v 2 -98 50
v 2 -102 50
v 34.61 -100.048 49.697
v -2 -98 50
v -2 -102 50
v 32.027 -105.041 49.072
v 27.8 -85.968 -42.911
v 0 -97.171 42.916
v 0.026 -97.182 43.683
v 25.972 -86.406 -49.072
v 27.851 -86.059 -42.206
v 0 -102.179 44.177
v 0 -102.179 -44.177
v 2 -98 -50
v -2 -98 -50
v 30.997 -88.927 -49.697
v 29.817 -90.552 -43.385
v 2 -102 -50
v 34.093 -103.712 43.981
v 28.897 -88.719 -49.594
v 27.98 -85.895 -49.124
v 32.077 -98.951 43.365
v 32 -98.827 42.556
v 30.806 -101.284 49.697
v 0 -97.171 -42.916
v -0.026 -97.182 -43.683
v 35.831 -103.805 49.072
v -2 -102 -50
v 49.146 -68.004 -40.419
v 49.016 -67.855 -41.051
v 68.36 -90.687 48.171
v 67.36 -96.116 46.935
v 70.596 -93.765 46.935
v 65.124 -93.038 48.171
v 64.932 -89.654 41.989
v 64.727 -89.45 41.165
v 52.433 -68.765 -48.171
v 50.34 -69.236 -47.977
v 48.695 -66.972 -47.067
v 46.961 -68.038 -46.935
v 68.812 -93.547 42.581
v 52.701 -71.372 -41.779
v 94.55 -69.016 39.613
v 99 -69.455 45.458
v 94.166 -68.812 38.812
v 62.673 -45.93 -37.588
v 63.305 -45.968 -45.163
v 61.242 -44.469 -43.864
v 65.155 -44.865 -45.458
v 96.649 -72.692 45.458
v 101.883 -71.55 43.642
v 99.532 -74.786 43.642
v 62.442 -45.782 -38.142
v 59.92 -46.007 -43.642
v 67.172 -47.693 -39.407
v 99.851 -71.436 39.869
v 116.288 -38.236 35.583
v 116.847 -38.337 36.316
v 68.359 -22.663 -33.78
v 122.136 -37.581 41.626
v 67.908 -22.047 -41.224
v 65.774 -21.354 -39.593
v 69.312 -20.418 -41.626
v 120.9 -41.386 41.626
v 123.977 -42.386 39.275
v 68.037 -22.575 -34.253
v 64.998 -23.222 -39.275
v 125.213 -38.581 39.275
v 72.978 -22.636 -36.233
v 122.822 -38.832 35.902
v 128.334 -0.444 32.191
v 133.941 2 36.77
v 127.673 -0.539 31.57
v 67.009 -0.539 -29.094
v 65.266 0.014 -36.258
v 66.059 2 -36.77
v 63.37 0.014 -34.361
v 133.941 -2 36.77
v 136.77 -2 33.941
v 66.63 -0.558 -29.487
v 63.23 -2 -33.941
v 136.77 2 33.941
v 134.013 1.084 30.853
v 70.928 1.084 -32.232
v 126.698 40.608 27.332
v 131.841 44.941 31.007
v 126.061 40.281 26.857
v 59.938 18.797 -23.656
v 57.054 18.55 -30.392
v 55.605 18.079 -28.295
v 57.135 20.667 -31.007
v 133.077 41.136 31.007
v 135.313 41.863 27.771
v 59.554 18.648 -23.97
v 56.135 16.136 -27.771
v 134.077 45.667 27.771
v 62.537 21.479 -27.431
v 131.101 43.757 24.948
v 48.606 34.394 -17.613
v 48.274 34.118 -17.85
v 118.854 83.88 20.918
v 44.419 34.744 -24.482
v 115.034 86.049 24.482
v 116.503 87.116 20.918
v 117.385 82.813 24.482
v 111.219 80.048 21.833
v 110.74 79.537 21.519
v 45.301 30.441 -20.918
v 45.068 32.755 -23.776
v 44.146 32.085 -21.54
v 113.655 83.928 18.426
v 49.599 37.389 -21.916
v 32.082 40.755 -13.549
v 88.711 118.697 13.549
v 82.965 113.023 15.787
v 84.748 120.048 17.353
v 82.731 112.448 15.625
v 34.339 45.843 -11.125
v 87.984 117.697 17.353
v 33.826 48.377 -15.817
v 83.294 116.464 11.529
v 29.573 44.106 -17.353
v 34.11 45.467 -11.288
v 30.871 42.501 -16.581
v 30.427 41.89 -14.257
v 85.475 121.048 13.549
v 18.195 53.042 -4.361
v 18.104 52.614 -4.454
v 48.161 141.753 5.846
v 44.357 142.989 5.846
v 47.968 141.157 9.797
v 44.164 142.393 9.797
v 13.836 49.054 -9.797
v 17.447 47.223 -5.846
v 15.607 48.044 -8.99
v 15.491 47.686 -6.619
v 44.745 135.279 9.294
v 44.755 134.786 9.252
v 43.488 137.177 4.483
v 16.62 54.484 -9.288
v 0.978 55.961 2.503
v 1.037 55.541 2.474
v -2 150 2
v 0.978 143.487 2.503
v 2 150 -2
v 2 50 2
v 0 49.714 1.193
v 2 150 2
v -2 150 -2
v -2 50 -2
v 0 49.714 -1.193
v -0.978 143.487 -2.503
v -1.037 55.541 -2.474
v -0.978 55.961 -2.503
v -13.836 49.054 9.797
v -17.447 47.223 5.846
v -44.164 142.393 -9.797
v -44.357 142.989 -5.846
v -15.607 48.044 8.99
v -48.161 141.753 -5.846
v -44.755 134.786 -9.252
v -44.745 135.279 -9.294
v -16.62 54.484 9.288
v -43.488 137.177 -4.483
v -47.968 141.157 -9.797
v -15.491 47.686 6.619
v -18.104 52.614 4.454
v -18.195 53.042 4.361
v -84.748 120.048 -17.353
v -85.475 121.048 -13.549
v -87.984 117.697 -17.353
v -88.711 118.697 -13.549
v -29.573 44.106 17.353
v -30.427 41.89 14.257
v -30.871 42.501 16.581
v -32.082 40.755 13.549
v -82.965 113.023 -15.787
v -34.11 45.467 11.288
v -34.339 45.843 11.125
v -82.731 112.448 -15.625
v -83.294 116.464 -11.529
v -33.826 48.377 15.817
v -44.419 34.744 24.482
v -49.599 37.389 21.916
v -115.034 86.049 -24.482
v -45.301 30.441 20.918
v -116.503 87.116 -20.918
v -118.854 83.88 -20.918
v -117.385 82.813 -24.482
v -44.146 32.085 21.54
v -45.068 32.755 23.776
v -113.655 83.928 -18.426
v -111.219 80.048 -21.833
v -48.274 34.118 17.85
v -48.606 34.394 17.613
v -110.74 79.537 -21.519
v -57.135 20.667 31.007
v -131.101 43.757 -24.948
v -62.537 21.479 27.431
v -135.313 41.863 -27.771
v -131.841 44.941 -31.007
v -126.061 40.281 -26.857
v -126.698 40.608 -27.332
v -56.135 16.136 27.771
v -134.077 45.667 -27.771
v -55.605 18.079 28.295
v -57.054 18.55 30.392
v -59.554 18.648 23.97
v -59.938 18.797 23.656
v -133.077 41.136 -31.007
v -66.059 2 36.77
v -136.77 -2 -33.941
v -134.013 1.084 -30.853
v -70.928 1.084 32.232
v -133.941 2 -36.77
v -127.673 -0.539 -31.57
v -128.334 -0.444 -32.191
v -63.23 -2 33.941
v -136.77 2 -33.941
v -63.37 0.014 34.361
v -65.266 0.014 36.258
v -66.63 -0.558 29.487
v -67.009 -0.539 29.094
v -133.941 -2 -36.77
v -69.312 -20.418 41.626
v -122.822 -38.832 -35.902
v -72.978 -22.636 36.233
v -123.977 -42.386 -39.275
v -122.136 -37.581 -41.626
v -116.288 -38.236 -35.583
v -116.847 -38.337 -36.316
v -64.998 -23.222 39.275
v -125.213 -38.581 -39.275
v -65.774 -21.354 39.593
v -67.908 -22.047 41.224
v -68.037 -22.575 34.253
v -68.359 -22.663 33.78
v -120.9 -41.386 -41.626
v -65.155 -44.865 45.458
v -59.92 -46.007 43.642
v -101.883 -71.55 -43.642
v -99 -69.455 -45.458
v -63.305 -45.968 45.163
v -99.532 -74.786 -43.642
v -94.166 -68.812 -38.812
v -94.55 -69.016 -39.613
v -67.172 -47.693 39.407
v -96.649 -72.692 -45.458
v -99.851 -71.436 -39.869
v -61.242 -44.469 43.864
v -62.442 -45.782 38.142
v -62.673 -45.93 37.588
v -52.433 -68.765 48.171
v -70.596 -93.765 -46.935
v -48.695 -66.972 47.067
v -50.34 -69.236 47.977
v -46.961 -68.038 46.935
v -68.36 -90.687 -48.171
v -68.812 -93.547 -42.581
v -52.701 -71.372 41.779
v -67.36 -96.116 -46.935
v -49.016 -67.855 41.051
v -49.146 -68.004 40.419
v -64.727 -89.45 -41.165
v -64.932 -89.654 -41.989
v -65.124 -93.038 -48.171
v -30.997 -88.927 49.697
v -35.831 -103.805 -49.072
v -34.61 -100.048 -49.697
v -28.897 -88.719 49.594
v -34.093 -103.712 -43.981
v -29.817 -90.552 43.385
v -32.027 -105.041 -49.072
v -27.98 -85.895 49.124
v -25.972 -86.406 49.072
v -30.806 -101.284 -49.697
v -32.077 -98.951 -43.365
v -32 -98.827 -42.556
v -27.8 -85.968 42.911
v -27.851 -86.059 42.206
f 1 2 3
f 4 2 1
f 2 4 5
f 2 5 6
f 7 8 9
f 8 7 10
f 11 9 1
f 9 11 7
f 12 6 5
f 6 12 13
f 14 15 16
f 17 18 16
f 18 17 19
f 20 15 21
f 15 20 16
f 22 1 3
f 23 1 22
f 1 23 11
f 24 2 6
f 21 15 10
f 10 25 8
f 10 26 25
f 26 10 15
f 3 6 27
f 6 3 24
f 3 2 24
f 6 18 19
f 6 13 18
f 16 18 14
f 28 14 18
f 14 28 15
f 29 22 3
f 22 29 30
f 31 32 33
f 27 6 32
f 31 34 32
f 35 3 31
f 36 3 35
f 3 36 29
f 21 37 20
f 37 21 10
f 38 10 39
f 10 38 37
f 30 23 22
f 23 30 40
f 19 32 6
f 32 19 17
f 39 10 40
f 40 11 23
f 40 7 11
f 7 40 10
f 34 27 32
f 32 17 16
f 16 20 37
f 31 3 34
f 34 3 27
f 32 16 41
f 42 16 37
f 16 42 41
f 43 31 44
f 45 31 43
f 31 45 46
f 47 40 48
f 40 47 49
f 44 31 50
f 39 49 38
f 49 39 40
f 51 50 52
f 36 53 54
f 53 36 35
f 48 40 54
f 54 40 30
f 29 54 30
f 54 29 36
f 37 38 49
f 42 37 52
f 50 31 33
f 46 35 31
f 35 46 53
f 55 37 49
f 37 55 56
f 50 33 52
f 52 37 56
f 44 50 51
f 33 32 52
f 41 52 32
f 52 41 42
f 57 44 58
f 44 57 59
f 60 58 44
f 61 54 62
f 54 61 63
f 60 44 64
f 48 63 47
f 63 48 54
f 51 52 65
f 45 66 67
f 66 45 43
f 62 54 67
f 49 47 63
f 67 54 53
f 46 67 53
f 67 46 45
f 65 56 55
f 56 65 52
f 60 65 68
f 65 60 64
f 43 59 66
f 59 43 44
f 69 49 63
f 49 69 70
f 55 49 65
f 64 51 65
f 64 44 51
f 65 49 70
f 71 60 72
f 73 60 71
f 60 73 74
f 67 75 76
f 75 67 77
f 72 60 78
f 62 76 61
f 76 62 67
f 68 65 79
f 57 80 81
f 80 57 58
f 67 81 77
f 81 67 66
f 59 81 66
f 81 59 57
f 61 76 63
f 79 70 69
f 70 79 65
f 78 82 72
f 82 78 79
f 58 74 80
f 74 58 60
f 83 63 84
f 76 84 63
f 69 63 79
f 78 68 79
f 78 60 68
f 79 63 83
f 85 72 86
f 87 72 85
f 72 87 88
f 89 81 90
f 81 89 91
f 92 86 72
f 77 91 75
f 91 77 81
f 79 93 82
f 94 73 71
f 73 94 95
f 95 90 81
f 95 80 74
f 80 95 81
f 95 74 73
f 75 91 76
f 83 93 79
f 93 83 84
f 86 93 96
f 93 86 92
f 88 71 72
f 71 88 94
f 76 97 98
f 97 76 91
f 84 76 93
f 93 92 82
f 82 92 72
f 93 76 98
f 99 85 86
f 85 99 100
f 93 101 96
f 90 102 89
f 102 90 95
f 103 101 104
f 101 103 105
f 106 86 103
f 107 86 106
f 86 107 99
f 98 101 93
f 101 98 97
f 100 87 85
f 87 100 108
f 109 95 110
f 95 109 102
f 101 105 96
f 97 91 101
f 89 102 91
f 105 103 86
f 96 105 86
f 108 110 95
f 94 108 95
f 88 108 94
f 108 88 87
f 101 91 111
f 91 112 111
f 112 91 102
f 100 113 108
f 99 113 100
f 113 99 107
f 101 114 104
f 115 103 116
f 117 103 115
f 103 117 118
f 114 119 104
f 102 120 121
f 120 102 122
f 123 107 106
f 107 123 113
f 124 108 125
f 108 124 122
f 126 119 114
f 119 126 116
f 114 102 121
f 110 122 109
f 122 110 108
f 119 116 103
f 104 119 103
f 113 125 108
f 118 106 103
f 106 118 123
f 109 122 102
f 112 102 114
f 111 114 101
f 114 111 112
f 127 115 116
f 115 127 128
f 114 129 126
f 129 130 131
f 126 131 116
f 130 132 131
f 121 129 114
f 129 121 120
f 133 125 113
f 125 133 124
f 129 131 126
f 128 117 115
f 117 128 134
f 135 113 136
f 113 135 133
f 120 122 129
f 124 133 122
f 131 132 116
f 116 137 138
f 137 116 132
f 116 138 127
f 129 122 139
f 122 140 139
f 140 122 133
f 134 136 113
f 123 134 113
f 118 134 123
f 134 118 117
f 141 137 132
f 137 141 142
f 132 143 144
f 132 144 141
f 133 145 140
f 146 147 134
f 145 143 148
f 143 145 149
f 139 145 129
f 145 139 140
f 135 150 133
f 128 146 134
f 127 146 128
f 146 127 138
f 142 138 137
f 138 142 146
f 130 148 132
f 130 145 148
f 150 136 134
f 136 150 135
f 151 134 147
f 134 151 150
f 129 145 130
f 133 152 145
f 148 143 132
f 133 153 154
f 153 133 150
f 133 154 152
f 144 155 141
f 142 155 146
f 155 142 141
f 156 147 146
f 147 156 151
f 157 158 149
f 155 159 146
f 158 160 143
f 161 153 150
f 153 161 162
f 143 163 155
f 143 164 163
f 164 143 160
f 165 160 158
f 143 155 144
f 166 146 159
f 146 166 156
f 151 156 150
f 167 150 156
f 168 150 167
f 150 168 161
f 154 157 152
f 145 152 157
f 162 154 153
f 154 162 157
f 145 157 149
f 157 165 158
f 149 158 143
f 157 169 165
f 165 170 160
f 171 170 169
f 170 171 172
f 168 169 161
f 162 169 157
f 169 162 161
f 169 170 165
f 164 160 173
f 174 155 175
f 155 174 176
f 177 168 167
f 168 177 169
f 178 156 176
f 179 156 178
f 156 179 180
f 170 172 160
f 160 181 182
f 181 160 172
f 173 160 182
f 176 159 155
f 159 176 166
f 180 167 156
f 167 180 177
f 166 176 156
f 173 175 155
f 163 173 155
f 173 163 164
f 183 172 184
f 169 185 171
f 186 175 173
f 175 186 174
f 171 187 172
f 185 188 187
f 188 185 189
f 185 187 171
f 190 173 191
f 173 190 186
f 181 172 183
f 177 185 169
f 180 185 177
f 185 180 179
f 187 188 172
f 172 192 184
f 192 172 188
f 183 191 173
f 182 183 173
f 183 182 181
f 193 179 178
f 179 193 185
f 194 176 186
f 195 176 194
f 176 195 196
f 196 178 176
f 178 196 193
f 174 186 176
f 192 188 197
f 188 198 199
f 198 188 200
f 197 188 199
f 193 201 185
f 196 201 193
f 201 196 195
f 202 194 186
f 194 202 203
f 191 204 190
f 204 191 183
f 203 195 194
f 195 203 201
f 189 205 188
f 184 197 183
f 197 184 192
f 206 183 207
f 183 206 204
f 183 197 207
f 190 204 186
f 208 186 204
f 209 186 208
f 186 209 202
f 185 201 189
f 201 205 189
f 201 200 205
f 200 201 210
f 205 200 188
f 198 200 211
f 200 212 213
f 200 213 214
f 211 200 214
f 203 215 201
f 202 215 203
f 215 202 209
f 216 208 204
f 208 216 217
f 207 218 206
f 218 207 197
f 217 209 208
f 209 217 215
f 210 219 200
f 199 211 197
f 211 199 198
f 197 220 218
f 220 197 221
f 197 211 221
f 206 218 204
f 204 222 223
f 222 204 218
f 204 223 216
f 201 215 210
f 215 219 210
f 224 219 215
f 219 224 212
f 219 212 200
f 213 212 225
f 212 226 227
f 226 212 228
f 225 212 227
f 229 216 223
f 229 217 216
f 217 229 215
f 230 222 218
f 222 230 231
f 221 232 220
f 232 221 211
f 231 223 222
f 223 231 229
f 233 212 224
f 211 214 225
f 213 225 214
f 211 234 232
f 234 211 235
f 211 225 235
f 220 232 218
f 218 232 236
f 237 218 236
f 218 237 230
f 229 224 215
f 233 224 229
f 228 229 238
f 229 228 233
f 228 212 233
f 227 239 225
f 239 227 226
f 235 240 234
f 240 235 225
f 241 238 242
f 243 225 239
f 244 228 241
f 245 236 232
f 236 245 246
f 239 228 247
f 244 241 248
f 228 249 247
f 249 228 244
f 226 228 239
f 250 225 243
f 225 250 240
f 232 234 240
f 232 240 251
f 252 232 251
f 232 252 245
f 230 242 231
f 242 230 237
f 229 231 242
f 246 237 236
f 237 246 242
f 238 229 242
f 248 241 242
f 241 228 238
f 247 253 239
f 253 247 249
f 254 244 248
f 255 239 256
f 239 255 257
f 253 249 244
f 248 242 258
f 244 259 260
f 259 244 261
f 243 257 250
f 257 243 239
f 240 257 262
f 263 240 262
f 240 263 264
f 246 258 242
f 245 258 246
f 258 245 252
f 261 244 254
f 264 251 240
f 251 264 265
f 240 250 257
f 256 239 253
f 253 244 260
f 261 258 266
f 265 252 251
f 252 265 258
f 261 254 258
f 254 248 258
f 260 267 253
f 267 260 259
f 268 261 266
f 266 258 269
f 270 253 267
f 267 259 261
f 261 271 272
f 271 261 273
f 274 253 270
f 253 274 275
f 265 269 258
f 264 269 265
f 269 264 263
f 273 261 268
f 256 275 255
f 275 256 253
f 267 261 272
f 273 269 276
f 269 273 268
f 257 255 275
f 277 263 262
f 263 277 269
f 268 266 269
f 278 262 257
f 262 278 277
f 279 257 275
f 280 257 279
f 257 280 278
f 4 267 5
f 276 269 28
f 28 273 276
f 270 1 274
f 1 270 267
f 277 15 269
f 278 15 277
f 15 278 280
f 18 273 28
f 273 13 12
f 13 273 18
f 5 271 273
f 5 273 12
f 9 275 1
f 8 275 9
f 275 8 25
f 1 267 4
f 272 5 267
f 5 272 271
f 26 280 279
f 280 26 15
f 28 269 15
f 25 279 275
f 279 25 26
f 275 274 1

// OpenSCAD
//This generates a bunch of rods that make a twisted strip

//Resolution of Strip.
number_of_rods = 20;//[20:500]

//Thickness of the wall.
thickness = 4;//[2:0.2:10]

//Height of wall.
length = 100;//[20:200]

//Inner Radius of the strip.
radius = 100;//[20:200]

//Number of twists.
twists = 1;//[0:10]

/* [Hidden] */


for(i=[0:number_of_rods]) {
	value = i/number_of_rods;
	value_1 = (i+1)/ number_of_rods;
	hull() {
		translate([radius*sin(value*360),-radius*cos(value*360),0]) 
		rotate(value*360,[0,0,1]) rotate(value*twists*180,[1,0,0])
			cube([thickness,thickness,length], center=true);
		//
		translate([radius*sin(value_1*360),-radius*cos(value_1*360),0]) 
		rotate(value_1*360,[0,0,1]) rotate(value_1*twists*180,[1,0,0])
			cube([thickness,thickness,length], center=true);
	}
}
//Programmed by Will Webber
// with a thank you to Neon22 for suggeting alterations to use the convex hull
